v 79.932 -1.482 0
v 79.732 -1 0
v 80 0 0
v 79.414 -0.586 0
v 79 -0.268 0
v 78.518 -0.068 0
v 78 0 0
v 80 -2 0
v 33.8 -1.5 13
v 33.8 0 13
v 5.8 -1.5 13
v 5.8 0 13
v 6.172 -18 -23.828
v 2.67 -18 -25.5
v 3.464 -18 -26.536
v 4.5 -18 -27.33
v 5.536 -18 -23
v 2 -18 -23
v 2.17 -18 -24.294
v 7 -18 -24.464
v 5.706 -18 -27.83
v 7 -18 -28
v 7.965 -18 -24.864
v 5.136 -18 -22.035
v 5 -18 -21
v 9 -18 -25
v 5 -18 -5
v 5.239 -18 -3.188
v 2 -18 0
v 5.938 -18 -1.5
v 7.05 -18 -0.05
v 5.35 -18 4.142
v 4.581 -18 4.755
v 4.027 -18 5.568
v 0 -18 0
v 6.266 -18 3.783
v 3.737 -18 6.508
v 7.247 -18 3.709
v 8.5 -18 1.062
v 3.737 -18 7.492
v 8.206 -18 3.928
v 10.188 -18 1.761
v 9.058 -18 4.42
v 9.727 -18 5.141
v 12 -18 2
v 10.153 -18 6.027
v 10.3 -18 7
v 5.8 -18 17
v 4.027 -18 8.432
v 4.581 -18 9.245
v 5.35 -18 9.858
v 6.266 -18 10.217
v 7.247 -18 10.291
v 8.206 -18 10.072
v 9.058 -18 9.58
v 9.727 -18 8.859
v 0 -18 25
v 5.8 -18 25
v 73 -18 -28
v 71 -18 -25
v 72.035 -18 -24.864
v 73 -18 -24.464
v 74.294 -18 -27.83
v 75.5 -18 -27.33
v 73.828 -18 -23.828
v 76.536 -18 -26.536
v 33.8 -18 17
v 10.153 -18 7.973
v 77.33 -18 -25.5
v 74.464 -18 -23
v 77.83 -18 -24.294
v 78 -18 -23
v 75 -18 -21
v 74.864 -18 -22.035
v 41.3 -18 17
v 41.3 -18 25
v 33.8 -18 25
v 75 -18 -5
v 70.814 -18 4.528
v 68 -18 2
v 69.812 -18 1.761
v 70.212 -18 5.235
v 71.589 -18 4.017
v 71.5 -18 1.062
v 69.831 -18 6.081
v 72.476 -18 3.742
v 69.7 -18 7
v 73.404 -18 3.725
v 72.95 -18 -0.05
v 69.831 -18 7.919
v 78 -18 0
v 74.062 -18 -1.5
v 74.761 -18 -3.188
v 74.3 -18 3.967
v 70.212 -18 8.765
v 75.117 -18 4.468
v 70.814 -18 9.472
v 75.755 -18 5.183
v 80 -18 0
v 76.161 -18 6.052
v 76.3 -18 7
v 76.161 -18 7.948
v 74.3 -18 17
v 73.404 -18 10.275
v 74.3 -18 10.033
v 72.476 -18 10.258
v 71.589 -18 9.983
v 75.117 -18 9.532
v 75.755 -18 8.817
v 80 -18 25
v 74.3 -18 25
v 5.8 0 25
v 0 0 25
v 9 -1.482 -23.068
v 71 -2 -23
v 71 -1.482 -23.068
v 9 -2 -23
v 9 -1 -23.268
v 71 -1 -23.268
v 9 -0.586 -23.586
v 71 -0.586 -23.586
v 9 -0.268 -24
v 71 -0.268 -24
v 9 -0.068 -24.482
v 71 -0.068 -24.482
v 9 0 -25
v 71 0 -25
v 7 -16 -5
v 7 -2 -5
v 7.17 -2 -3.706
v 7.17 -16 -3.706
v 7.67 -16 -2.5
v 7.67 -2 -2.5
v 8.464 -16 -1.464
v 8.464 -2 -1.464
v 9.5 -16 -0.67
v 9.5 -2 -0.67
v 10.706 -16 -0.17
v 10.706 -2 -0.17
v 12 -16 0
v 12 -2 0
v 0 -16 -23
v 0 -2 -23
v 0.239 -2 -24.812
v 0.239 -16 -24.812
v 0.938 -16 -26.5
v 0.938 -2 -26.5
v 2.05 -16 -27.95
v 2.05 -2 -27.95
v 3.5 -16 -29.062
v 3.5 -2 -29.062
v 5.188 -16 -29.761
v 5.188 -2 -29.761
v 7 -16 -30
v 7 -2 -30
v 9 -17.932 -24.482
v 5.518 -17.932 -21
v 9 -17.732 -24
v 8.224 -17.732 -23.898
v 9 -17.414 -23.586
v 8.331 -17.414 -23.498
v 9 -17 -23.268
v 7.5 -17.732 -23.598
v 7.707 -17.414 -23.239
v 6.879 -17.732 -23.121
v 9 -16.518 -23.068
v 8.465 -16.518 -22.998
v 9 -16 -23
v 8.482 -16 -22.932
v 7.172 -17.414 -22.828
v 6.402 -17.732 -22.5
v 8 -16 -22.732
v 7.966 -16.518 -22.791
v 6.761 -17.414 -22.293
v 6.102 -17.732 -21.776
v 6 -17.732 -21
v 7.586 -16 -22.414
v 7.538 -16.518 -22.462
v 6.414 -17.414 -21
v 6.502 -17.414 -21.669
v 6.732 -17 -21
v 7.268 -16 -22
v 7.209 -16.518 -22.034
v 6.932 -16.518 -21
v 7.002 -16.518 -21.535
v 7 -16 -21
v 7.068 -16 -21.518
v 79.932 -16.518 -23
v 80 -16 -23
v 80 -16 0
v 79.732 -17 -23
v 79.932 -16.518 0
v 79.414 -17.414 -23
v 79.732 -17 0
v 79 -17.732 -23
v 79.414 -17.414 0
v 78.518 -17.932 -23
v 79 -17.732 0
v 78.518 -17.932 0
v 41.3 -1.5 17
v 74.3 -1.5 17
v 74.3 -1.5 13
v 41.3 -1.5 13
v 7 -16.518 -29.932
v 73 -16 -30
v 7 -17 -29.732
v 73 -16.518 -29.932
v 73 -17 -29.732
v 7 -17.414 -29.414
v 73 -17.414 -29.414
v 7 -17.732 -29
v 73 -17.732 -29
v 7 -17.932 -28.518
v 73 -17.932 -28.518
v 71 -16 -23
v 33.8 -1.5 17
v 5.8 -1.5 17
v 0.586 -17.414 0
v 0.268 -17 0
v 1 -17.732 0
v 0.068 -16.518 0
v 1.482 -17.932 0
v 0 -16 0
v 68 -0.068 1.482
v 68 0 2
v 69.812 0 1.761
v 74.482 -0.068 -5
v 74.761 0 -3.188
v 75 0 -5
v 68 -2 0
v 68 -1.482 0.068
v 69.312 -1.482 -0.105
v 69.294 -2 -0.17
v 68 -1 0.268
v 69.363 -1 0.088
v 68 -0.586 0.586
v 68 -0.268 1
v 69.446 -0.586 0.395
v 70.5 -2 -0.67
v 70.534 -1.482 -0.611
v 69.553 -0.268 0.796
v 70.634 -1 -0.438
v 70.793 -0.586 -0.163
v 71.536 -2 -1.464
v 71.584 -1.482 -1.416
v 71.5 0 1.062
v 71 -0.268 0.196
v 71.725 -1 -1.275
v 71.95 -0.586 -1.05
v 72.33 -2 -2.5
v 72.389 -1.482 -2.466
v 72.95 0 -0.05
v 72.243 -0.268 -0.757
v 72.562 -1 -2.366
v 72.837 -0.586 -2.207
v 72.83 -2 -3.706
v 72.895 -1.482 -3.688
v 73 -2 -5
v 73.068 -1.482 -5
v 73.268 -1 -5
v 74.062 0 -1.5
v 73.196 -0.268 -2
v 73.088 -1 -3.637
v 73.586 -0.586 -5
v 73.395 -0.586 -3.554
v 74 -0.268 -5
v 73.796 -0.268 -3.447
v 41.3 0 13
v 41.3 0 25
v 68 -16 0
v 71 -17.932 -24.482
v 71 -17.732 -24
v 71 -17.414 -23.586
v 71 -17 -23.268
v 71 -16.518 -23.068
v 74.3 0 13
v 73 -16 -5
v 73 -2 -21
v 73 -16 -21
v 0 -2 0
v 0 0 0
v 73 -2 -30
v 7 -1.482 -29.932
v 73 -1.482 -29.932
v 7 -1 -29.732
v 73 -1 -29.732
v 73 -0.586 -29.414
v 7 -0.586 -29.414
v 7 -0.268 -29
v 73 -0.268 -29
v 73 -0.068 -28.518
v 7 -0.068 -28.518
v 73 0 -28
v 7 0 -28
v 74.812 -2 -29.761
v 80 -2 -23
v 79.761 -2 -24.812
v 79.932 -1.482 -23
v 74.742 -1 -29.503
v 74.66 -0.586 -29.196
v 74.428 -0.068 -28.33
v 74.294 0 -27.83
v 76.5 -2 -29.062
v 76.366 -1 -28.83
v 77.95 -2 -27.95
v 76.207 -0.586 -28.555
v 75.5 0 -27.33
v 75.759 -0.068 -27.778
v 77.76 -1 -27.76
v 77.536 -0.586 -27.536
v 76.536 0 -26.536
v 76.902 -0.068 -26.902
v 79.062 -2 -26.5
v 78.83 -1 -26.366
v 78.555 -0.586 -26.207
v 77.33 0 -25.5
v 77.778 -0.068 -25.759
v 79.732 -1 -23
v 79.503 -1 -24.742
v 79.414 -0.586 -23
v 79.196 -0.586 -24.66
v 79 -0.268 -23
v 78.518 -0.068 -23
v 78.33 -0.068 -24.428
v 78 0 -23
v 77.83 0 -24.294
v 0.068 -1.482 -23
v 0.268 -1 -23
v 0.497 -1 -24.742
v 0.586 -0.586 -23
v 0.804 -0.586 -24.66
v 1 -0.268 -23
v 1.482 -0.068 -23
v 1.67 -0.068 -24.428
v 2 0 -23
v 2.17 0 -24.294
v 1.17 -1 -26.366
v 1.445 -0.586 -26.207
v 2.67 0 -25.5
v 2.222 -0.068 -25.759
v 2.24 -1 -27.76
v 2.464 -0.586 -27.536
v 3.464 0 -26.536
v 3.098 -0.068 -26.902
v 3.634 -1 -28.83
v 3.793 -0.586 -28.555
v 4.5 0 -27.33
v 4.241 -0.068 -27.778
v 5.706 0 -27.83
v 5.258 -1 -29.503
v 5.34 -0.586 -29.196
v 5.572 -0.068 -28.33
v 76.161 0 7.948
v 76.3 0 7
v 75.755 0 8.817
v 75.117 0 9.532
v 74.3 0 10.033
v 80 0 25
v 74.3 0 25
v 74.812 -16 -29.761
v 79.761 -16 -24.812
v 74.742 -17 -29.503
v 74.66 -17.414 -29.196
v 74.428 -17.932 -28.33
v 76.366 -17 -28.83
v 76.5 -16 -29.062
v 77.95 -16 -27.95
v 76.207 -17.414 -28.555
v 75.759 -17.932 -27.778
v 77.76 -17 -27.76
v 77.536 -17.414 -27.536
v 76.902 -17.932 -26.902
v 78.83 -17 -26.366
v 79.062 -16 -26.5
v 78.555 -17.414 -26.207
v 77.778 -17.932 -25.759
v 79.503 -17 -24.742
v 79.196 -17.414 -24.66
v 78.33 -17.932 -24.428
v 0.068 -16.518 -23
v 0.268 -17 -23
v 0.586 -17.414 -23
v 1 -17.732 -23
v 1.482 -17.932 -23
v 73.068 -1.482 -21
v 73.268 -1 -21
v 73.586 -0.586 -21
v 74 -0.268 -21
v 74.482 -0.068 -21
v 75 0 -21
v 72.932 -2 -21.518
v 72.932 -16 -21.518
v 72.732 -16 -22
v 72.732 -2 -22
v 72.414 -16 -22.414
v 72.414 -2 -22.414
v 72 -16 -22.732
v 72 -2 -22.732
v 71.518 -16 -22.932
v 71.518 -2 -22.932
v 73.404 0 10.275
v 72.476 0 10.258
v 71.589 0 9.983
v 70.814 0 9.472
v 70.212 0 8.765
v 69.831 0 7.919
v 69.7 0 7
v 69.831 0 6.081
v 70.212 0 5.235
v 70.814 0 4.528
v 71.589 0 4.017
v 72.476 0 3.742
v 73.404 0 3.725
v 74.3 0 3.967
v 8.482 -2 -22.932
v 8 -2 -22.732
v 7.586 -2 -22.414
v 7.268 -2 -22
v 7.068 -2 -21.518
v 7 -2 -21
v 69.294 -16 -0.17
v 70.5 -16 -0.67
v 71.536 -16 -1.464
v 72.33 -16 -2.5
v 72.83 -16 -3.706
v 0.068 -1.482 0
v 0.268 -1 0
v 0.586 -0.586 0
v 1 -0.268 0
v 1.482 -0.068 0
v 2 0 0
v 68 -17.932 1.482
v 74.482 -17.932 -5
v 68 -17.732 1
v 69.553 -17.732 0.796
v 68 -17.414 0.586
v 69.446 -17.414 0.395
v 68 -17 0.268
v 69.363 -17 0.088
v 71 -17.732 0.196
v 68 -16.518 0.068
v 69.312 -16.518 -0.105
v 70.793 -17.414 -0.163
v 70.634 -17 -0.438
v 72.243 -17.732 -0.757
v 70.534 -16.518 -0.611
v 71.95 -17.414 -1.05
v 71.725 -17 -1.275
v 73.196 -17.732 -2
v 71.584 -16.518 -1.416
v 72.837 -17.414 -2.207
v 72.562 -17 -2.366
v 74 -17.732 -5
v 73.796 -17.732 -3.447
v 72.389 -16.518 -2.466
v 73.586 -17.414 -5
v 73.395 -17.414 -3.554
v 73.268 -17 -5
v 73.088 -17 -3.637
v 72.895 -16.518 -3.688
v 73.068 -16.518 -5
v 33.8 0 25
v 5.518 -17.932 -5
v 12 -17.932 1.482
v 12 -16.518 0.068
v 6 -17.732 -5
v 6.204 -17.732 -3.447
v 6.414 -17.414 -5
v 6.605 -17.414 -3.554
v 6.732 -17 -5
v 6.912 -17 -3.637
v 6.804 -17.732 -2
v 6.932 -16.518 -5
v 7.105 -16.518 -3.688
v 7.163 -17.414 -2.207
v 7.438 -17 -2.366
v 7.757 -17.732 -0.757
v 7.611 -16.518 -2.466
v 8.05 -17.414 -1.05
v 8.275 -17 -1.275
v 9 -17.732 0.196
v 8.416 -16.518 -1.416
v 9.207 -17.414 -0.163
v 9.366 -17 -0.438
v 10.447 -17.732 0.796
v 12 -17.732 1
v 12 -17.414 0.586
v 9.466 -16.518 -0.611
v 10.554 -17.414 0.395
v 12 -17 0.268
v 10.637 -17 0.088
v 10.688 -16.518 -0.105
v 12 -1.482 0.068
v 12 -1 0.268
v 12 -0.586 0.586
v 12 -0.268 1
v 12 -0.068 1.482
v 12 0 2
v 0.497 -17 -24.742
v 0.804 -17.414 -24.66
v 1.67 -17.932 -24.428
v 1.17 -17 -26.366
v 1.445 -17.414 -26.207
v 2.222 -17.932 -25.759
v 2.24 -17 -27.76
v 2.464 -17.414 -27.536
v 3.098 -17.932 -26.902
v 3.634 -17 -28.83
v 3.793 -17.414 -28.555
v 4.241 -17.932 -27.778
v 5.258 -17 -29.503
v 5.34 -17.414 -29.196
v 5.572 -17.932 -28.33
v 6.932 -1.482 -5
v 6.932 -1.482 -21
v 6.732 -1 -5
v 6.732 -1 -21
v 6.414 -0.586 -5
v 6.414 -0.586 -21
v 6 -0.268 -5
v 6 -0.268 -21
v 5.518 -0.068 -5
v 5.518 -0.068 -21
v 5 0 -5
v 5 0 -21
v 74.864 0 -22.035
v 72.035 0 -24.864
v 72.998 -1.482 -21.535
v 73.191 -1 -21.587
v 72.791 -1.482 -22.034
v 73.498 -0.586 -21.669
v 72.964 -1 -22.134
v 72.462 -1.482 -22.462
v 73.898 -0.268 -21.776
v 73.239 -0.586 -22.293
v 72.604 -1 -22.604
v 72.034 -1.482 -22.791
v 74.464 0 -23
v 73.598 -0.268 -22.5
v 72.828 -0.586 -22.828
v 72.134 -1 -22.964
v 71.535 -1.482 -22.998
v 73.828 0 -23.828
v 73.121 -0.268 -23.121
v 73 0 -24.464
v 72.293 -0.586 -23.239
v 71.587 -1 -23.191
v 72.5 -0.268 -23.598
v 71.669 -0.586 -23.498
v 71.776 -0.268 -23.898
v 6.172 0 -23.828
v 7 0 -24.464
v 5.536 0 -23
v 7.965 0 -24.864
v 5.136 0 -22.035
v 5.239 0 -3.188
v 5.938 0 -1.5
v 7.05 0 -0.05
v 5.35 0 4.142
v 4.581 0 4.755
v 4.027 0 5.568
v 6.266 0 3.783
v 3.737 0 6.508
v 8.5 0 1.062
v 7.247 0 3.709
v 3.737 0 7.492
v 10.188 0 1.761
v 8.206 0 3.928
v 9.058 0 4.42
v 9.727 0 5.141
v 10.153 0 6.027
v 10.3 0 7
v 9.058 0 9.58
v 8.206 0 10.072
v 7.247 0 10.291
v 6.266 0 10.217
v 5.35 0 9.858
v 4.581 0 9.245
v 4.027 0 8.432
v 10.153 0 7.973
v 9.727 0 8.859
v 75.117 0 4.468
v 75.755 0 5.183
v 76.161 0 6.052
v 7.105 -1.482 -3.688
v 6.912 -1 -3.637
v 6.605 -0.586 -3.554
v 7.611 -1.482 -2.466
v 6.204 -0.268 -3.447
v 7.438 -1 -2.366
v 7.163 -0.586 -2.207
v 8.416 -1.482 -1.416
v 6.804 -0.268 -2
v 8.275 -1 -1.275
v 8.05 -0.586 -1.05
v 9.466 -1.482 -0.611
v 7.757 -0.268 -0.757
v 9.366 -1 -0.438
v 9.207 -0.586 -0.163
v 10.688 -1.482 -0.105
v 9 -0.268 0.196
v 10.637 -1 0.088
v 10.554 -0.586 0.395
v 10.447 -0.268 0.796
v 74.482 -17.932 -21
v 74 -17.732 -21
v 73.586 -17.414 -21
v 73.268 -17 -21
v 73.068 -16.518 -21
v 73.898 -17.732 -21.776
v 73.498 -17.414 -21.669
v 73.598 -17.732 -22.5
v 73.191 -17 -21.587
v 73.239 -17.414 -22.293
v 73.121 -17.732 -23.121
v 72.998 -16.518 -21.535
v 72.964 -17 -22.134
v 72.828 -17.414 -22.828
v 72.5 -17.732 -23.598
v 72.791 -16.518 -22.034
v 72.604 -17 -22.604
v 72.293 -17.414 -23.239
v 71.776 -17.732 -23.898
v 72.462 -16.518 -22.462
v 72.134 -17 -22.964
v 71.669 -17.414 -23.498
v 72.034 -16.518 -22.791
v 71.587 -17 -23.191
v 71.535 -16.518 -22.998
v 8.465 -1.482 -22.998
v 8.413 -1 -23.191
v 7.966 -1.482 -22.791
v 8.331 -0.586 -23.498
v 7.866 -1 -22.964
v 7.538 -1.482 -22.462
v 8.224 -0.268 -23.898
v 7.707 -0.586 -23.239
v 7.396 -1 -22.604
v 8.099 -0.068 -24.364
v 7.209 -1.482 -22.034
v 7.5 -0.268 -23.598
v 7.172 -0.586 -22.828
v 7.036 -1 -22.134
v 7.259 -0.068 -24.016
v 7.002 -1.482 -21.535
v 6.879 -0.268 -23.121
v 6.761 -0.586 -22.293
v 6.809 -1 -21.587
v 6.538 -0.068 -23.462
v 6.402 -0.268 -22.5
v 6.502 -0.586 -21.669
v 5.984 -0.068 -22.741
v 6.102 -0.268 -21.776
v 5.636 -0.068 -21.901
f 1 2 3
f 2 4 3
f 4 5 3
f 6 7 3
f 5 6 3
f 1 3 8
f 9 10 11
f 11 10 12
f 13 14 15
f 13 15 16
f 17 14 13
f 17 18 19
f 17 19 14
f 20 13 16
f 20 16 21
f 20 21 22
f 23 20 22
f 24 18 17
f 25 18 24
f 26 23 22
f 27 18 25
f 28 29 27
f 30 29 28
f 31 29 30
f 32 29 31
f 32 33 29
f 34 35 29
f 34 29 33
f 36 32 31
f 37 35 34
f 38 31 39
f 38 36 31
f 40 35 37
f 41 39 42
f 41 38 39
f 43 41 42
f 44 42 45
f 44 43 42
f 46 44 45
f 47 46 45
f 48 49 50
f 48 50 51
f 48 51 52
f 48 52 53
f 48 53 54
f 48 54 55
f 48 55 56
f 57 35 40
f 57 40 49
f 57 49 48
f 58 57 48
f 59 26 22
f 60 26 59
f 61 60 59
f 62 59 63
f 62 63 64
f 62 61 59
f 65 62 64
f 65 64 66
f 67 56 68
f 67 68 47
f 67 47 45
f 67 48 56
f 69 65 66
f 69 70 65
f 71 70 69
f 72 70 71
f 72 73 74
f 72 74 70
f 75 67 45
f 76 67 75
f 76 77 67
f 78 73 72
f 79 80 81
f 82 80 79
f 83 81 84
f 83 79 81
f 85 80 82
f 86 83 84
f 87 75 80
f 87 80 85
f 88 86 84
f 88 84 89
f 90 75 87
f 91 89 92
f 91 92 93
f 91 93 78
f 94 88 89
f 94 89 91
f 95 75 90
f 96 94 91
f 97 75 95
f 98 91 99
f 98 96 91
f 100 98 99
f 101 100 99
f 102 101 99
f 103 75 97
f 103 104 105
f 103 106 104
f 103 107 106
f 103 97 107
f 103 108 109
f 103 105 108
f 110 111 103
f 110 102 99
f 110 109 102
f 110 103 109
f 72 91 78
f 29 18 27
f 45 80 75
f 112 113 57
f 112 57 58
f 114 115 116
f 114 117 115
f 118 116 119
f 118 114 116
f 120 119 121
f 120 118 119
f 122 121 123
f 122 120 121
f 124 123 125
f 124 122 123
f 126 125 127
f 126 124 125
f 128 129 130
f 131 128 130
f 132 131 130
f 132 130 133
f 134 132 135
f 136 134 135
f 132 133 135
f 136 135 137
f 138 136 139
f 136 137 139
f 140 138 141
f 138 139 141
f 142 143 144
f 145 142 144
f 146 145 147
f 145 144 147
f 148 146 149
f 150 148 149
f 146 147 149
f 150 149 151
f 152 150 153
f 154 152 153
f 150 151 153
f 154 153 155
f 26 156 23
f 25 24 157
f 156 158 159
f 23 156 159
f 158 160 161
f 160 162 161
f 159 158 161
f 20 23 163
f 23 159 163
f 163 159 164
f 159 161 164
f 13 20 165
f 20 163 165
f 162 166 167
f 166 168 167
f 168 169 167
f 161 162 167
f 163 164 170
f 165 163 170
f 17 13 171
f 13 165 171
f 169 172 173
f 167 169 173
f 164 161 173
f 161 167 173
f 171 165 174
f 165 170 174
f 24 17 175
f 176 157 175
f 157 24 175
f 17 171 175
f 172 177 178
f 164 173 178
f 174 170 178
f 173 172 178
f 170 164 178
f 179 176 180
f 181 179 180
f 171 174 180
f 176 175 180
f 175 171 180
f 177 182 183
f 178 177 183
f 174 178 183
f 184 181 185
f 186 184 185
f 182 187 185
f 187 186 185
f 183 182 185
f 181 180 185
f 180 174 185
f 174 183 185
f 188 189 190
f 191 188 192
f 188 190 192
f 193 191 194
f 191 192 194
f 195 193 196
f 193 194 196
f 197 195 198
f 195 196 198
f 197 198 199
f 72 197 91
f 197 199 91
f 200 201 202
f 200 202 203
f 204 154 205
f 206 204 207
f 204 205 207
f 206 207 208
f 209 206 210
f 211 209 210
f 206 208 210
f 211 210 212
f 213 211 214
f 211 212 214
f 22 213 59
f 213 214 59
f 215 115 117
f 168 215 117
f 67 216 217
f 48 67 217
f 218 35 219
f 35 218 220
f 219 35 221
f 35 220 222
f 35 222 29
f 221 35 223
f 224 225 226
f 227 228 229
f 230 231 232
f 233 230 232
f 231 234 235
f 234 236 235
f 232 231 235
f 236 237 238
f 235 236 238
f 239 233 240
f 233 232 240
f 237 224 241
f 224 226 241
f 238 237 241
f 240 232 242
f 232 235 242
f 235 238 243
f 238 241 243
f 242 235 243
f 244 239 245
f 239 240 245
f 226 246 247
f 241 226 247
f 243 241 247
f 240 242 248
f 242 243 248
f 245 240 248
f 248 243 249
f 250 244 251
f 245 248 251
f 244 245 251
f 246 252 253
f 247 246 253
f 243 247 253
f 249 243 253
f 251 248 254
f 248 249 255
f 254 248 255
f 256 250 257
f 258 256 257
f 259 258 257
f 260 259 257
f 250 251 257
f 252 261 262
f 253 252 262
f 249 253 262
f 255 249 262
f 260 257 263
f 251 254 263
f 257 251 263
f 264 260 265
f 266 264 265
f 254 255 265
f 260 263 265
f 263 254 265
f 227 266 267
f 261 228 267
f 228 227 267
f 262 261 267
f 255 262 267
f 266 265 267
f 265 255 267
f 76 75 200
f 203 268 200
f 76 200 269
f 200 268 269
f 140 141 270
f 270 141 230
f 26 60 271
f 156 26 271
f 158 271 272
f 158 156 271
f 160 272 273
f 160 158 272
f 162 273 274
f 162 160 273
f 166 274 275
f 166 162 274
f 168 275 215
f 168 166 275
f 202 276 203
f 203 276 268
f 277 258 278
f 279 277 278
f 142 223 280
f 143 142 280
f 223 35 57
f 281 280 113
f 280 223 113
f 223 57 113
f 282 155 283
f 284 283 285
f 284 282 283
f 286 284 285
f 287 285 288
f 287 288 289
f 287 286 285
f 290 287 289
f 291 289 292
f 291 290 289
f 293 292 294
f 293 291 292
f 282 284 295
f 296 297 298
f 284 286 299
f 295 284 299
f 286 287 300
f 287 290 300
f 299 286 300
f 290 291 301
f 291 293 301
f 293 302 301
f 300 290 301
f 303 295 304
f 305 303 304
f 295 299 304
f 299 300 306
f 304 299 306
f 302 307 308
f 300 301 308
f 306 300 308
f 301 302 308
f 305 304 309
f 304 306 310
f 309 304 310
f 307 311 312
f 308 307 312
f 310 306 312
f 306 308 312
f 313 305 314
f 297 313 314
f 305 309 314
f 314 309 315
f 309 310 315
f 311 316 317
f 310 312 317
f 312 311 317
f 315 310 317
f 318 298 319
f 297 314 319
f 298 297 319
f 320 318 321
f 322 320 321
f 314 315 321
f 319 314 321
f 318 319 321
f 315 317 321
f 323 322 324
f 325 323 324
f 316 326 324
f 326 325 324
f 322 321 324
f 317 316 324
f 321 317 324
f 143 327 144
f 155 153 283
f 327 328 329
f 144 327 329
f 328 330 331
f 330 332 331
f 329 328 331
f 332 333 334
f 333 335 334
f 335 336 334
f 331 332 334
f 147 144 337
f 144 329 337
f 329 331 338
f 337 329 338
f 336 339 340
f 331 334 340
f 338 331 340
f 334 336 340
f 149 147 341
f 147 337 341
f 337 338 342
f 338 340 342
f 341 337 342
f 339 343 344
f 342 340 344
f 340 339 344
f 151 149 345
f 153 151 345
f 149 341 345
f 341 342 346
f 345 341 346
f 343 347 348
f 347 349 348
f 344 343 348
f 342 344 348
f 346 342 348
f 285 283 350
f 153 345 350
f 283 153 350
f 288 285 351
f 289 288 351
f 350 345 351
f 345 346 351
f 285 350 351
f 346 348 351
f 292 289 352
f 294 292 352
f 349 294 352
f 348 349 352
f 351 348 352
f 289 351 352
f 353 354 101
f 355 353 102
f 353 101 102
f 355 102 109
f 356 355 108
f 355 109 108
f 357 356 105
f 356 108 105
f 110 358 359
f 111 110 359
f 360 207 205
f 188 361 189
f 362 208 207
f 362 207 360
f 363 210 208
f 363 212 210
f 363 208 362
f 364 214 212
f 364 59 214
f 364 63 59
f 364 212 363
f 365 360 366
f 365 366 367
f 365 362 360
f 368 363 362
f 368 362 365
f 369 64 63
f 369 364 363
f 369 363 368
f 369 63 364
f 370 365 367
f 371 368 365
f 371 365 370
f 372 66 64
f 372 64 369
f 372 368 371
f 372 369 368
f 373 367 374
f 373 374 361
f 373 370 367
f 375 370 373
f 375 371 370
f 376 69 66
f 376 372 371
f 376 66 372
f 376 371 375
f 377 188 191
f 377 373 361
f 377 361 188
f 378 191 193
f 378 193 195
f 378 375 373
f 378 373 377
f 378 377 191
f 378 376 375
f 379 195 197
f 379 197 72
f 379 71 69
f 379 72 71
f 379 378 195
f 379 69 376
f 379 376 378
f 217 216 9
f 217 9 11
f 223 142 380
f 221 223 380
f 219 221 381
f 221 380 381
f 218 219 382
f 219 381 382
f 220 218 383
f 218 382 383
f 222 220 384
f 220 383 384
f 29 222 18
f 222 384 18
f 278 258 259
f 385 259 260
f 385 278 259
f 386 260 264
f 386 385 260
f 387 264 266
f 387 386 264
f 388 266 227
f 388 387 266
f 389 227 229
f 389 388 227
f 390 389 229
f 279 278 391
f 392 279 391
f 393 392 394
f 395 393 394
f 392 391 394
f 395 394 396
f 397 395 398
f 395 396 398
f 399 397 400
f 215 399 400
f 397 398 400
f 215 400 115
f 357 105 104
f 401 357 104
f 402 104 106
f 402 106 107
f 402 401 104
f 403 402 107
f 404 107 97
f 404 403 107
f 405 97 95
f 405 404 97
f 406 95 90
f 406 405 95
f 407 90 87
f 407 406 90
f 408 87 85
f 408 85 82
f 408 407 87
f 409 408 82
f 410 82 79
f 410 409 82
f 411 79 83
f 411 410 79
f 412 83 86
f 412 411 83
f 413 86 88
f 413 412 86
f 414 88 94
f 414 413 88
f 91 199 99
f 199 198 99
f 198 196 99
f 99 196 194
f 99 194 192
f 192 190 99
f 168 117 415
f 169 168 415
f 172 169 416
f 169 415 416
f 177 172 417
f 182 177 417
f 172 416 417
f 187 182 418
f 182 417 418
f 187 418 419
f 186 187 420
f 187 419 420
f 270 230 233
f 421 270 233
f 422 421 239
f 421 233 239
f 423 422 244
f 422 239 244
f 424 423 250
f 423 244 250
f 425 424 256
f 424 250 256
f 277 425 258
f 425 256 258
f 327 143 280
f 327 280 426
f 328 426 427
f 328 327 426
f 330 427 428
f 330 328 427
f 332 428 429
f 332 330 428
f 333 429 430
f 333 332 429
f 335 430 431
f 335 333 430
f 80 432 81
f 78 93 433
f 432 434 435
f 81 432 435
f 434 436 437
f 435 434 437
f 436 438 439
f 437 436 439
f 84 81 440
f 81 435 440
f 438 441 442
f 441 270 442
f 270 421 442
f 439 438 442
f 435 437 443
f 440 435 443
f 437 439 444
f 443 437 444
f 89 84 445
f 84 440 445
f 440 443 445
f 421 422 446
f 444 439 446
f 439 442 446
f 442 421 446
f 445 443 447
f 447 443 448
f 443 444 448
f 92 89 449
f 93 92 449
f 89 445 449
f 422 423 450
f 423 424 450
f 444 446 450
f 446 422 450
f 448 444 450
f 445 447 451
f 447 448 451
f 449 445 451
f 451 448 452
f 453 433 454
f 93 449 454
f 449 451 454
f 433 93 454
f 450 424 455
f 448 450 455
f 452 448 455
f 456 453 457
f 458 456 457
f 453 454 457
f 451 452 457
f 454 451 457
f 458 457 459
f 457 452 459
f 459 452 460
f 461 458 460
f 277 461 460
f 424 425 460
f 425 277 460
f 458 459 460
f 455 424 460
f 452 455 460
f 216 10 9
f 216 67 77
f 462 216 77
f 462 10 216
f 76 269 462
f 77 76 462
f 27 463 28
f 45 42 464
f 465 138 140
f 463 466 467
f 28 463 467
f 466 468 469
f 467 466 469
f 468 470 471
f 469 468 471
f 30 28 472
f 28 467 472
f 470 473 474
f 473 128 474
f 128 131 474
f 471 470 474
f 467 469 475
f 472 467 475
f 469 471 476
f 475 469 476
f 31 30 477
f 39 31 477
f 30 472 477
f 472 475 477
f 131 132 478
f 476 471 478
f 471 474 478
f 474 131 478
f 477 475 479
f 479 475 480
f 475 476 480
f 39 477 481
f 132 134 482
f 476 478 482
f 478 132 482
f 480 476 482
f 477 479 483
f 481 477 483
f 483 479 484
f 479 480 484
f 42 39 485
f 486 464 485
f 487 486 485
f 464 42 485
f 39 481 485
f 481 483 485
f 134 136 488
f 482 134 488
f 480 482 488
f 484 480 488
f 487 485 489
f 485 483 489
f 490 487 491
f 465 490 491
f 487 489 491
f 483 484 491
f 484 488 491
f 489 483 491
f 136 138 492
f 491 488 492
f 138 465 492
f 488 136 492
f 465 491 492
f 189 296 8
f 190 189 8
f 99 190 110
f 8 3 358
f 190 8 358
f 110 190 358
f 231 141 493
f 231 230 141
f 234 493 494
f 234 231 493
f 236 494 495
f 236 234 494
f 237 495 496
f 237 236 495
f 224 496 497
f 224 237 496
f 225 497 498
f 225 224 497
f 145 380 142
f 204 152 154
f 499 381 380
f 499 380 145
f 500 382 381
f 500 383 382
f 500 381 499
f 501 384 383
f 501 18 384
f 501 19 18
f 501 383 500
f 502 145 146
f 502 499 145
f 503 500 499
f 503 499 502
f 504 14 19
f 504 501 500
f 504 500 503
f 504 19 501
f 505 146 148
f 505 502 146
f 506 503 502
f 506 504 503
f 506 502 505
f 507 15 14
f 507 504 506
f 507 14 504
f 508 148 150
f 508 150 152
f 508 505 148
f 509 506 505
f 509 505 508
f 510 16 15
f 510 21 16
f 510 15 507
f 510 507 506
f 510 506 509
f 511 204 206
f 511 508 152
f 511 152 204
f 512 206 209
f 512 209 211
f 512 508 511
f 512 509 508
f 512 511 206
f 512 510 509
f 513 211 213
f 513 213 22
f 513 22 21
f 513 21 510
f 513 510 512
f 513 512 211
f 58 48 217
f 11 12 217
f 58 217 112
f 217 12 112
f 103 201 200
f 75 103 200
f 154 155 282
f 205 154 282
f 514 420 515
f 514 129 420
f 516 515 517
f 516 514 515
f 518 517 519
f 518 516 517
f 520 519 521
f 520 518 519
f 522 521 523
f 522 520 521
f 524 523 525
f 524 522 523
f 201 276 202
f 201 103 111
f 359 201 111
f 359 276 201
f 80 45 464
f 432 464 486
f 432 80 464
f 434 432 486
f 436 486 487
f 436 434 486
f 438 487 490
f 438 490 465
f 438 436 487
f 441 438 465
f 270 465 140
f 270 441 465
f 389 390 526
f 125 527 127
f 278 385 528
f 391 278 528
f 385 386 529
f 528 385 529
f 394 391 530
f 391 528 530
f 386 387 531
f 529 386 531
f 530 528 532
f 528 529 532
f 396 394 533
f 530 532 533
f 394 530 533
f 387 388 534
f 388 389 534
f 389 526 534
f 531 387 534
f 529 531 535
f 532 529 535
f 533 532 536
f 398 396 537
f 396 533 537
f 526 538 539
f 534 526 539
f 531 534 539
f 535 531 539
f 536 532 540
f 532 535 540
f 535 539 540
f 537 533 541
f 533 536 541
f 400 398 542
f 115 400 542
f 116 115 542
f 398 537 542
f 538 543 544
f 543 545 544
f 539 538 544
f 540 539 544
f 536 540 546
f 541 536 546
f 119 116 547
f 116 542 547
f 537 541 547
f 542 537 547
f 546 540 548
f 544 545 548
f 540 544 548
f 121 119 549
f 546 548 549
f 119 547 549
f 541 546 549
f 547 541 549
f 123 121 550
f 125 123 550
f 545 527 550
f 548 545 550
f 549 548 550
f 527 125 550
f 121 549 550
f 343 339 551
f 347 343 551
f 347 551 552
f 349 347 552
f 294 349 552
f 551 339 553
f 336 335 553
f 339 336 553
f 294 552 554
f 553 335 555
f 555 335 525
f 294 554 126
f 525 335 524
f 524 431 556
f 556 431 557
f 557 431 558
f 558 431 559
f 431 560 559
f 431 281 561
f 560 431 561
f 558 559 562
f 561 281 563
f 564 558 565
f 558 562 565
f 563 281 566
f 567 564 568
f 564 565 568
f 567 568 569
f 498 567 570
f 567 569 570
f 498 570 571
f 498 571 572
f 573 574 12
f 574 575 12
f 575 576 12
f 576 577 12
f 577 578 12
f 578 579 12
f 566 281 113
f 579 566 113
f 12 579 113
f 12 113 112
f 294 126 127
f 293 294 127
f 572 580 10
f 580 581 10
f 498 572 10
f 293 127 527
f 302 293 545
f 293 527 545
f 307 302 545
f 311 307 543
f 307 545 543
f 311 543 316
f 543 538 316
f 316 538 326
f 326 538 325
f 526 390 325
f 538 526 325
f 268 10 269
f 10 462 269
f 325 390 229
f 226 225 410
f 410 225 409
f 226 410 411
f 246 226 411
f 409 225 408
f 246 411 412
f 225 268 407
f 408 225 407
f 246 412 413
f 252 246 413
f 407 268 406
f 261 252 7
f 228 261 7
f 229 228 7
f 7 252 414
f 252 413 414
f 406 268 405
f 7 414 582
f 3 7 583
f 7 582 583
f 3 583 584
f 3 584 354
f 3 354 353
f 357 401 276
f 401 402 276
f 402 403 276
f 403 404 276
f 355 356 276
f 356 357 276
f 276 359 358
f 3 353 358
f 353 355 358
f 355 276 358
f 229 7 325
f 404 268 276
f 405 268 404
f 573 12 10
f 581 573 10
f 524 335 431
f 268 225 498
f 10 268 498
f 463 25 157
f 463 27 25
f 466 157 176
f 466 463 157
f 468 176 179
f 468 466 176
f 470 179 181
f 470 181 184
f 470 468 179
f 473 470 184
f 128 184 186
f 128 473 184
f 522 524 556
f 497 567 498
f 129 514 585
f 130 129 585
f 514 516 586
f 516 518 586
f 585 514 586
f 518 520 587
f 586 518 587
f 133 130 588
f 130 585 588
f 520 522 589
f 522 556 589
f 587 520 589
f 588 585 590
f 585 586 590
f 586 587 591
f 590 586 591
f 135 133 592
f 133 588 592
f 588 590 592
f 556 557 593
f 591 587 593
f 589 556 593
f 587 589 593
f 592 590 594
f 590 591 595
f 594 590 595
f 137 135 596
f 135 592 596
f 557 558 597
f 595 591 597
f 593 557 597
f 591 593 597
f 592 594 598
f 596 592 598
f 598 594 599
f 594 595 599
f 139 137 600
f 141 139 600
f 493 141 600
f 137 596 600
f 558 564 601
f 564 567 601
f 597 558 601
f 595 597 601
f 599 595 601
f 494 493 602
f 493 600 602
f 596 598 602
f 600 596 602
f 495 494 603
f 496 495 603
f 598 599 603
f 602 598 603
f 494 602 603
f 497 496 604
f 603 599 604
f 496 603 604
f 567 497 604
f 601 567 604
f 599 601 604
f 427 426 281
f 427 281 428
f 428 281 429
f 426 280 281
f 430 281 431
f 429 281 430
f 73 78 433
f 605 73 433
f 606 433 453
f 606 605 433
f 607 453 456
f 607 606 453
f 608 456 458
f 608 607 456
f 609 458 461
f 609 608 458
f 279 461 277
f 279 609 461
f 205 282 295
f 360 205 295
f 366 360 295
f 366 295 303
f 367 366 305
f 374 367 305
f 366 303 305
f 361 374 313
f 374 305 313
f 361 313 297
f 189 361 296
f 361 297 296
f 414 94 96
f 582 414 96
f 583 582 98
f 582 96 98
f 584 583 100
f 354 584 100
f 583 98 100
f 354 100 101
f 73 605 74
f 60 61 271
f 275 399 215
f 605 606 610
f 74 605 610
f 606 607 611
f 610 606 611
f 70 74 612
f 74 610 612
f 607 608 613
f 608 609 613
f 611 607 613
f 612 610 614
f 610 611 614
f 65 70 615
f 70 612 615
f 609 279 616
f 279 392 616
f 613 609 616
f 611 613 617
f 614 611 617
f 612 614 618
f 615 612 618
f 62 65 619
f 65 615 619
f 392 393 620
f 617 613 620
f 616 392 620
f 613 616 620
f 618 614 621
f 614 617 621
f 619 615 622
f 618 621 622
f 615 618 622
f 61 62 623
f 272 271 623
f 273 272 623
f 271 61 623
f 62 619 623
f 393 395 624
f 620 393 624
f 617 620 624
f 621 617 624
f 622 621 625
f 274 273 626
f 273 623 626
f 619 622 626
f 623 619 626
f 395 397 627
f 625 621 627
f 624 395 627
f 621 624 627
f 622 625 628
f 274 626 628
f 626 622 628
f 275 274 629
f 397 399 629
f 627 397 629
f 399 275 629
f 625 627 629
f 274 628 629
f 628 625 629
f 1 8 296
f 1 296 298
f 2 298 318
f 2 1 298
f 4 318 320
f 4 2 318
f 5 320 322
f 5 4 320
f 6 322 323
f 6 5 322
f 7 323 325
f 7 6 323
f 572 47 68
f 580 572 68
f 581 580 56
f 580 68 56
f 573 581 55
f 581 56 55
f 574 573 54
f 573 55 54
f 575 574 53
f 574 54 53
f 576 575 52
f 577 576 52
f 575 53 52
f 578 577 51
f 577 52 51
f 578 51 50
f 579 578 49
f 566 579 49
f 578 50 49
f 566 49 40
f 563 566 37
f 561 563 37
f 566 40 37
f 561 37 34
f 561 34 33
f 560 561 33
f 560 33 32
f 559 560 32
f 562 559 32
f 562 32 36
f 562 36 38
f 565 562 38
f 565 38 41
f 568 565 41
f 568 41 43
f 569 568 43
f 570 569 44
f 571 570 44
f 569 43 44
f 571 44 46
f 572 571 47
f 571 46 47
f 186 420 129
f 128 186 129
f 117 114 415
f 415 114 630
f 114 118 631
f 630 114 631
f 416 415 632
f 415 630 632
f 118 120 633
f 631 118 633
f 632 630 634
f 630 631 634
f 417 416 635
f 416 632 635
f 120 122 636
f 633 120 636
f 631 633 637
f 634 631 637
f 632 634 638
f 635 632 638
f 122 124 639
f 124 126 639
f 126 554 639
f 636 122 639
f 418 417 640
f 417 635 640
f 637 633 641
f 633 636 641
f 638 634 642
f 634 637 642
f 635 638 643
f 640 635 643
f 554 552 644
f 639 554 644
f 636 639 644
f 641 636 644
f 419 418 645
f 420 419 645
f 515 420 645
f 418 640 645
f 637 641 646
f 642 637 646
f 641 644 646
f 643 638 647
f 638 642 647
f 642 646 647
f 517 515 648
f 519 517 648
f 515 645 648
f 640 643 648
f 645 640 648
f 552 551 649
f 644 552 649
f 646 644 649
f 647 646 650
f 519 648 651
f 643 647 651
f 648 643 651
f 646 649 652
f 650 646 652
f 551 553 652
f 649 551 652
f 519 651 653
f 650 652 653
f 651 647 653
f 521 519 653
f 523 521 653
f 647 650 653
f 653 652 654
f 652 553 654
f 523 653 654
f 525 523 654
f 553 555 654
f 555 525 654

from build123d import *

# Parameters (mm, degrees)
F0_R     = 3.3
F1_DEPTH = 18
F2_W     = 33
F2_H     = 4
F2_W_2   = 28
F3_DEPTH = 1.5
F4_R     = 2
F5_W     = 5.8
F5_H     = 18
F5_W_2   = 5.7
F6_DEPTH = 25
F7_R     = 3.3
F8_DEPTH = 18.001


with BuildPart() as f1:
    # F0 (on Front) → F1 (new body)
    with BuildSketch(Plane.XZ):
        with BuildLine():
            Line((0, 25), (0, 0))
            Line((0, 0), (0, -23))
            ThreePointArc((0, -23), (2.050253, -27.949747), (7, -30))
            Line((7, -30), (73, -30))
            ThreePointArc((73, -30), (77.949747, -27.949747), (80, -23))
            Line((80, -23), (80, 0))
            Line((80, 0), (80, 25))
            Line((80, 25), (74.3, 25))
            Line((74.3, 25), (74.3, 17))
            Line((74.3, 17), (41.3, 17))
            Line((41.3, 17), (41.3, 25))
            Line((41.3, 25), (33.8, 25))
            Line((33.8, 25), (33.8, 17))
            Line((33.8, 17), (5.8, 17))
            Line((5.8, 17), (5.8, 25))
            Line((5.8, 25), (0, 25))
        make_face()
        with BuildLine():
            ThreePointArc((7, -5), (8.464466, -1.464466), (12, 0))
            Line((12, 0), (68, 0))
            ThreePointArc((68, 0), (71.535534, -1.464466), (73, -5))
            Line((73, -5), (73, -21))
            ThreePointArc((73, -21), (72.414214, -22.414214), (71, -23))
            Line((71, -23), (9, -23))
            ThreePointArc((9, -23), (7.585786, -22.414214), (7, -21))
            Line((7, -21), (7, -5))
        make_face(mode=Mode.SUBTRACT)
        with Locations((7, 7)):
            Circle(F0_R, mode=Mode.SUBTRACT)
        with Locations((73, 7)):
            Circle(F0_R, mode=Mode.SUBTRACT)
    extrude(amount=F1_DEPTH)

    # F2 (on face) → F3 (cut)
    with BuildSketch(Plane(origin=(0, 0, 0), x_dir=(-1, 0, 0), z_dir=(0, 1, 0))):
        with Locations((-57.8, 15)):
            Rectangle(F2_W, F2_H)
        with Locations((-19.8, 15)):
            Rectangle(F2_W_2, F2_H)
    extrude(amount=-F3_DEPTH, mode=Mode.SUBTRACT)

    # F4
    f4_edges = [f1.edges().sort_by_distance(p)[0] for p in [
        (72.414214, 0, -22.414214),
        (73, 0, -13),
        (7, -18, -13),
        (40, 0, -30),
        (0, -18, 1),
    ]]
    fillet(f4_edges, radius=F4_R)

    # F5 (on face) → F6 (join)
    with BuildSketch(Plane.XY.offset(25)):
        with Locations((2.9, -9)):
            Rectangle(F5_W, F5_H)
        with Locations((77.15, -9)):
            Rectangle(F5_W_2, F5_H)
    extrude(amount=-F6_DEPTH)

    # F7 (on face) → F8 (cut, through all)
    with BuildSketch(Plane.XZ.offset(18)):
        with Locations((73, 7)):
            Circle(F7_R)
        with Locations((7, 7)):
            Circle(F7_R)
    extrude(amount=-F8_DEPTH, mode=Mode.SUBTRACT)


solid = f1.part
